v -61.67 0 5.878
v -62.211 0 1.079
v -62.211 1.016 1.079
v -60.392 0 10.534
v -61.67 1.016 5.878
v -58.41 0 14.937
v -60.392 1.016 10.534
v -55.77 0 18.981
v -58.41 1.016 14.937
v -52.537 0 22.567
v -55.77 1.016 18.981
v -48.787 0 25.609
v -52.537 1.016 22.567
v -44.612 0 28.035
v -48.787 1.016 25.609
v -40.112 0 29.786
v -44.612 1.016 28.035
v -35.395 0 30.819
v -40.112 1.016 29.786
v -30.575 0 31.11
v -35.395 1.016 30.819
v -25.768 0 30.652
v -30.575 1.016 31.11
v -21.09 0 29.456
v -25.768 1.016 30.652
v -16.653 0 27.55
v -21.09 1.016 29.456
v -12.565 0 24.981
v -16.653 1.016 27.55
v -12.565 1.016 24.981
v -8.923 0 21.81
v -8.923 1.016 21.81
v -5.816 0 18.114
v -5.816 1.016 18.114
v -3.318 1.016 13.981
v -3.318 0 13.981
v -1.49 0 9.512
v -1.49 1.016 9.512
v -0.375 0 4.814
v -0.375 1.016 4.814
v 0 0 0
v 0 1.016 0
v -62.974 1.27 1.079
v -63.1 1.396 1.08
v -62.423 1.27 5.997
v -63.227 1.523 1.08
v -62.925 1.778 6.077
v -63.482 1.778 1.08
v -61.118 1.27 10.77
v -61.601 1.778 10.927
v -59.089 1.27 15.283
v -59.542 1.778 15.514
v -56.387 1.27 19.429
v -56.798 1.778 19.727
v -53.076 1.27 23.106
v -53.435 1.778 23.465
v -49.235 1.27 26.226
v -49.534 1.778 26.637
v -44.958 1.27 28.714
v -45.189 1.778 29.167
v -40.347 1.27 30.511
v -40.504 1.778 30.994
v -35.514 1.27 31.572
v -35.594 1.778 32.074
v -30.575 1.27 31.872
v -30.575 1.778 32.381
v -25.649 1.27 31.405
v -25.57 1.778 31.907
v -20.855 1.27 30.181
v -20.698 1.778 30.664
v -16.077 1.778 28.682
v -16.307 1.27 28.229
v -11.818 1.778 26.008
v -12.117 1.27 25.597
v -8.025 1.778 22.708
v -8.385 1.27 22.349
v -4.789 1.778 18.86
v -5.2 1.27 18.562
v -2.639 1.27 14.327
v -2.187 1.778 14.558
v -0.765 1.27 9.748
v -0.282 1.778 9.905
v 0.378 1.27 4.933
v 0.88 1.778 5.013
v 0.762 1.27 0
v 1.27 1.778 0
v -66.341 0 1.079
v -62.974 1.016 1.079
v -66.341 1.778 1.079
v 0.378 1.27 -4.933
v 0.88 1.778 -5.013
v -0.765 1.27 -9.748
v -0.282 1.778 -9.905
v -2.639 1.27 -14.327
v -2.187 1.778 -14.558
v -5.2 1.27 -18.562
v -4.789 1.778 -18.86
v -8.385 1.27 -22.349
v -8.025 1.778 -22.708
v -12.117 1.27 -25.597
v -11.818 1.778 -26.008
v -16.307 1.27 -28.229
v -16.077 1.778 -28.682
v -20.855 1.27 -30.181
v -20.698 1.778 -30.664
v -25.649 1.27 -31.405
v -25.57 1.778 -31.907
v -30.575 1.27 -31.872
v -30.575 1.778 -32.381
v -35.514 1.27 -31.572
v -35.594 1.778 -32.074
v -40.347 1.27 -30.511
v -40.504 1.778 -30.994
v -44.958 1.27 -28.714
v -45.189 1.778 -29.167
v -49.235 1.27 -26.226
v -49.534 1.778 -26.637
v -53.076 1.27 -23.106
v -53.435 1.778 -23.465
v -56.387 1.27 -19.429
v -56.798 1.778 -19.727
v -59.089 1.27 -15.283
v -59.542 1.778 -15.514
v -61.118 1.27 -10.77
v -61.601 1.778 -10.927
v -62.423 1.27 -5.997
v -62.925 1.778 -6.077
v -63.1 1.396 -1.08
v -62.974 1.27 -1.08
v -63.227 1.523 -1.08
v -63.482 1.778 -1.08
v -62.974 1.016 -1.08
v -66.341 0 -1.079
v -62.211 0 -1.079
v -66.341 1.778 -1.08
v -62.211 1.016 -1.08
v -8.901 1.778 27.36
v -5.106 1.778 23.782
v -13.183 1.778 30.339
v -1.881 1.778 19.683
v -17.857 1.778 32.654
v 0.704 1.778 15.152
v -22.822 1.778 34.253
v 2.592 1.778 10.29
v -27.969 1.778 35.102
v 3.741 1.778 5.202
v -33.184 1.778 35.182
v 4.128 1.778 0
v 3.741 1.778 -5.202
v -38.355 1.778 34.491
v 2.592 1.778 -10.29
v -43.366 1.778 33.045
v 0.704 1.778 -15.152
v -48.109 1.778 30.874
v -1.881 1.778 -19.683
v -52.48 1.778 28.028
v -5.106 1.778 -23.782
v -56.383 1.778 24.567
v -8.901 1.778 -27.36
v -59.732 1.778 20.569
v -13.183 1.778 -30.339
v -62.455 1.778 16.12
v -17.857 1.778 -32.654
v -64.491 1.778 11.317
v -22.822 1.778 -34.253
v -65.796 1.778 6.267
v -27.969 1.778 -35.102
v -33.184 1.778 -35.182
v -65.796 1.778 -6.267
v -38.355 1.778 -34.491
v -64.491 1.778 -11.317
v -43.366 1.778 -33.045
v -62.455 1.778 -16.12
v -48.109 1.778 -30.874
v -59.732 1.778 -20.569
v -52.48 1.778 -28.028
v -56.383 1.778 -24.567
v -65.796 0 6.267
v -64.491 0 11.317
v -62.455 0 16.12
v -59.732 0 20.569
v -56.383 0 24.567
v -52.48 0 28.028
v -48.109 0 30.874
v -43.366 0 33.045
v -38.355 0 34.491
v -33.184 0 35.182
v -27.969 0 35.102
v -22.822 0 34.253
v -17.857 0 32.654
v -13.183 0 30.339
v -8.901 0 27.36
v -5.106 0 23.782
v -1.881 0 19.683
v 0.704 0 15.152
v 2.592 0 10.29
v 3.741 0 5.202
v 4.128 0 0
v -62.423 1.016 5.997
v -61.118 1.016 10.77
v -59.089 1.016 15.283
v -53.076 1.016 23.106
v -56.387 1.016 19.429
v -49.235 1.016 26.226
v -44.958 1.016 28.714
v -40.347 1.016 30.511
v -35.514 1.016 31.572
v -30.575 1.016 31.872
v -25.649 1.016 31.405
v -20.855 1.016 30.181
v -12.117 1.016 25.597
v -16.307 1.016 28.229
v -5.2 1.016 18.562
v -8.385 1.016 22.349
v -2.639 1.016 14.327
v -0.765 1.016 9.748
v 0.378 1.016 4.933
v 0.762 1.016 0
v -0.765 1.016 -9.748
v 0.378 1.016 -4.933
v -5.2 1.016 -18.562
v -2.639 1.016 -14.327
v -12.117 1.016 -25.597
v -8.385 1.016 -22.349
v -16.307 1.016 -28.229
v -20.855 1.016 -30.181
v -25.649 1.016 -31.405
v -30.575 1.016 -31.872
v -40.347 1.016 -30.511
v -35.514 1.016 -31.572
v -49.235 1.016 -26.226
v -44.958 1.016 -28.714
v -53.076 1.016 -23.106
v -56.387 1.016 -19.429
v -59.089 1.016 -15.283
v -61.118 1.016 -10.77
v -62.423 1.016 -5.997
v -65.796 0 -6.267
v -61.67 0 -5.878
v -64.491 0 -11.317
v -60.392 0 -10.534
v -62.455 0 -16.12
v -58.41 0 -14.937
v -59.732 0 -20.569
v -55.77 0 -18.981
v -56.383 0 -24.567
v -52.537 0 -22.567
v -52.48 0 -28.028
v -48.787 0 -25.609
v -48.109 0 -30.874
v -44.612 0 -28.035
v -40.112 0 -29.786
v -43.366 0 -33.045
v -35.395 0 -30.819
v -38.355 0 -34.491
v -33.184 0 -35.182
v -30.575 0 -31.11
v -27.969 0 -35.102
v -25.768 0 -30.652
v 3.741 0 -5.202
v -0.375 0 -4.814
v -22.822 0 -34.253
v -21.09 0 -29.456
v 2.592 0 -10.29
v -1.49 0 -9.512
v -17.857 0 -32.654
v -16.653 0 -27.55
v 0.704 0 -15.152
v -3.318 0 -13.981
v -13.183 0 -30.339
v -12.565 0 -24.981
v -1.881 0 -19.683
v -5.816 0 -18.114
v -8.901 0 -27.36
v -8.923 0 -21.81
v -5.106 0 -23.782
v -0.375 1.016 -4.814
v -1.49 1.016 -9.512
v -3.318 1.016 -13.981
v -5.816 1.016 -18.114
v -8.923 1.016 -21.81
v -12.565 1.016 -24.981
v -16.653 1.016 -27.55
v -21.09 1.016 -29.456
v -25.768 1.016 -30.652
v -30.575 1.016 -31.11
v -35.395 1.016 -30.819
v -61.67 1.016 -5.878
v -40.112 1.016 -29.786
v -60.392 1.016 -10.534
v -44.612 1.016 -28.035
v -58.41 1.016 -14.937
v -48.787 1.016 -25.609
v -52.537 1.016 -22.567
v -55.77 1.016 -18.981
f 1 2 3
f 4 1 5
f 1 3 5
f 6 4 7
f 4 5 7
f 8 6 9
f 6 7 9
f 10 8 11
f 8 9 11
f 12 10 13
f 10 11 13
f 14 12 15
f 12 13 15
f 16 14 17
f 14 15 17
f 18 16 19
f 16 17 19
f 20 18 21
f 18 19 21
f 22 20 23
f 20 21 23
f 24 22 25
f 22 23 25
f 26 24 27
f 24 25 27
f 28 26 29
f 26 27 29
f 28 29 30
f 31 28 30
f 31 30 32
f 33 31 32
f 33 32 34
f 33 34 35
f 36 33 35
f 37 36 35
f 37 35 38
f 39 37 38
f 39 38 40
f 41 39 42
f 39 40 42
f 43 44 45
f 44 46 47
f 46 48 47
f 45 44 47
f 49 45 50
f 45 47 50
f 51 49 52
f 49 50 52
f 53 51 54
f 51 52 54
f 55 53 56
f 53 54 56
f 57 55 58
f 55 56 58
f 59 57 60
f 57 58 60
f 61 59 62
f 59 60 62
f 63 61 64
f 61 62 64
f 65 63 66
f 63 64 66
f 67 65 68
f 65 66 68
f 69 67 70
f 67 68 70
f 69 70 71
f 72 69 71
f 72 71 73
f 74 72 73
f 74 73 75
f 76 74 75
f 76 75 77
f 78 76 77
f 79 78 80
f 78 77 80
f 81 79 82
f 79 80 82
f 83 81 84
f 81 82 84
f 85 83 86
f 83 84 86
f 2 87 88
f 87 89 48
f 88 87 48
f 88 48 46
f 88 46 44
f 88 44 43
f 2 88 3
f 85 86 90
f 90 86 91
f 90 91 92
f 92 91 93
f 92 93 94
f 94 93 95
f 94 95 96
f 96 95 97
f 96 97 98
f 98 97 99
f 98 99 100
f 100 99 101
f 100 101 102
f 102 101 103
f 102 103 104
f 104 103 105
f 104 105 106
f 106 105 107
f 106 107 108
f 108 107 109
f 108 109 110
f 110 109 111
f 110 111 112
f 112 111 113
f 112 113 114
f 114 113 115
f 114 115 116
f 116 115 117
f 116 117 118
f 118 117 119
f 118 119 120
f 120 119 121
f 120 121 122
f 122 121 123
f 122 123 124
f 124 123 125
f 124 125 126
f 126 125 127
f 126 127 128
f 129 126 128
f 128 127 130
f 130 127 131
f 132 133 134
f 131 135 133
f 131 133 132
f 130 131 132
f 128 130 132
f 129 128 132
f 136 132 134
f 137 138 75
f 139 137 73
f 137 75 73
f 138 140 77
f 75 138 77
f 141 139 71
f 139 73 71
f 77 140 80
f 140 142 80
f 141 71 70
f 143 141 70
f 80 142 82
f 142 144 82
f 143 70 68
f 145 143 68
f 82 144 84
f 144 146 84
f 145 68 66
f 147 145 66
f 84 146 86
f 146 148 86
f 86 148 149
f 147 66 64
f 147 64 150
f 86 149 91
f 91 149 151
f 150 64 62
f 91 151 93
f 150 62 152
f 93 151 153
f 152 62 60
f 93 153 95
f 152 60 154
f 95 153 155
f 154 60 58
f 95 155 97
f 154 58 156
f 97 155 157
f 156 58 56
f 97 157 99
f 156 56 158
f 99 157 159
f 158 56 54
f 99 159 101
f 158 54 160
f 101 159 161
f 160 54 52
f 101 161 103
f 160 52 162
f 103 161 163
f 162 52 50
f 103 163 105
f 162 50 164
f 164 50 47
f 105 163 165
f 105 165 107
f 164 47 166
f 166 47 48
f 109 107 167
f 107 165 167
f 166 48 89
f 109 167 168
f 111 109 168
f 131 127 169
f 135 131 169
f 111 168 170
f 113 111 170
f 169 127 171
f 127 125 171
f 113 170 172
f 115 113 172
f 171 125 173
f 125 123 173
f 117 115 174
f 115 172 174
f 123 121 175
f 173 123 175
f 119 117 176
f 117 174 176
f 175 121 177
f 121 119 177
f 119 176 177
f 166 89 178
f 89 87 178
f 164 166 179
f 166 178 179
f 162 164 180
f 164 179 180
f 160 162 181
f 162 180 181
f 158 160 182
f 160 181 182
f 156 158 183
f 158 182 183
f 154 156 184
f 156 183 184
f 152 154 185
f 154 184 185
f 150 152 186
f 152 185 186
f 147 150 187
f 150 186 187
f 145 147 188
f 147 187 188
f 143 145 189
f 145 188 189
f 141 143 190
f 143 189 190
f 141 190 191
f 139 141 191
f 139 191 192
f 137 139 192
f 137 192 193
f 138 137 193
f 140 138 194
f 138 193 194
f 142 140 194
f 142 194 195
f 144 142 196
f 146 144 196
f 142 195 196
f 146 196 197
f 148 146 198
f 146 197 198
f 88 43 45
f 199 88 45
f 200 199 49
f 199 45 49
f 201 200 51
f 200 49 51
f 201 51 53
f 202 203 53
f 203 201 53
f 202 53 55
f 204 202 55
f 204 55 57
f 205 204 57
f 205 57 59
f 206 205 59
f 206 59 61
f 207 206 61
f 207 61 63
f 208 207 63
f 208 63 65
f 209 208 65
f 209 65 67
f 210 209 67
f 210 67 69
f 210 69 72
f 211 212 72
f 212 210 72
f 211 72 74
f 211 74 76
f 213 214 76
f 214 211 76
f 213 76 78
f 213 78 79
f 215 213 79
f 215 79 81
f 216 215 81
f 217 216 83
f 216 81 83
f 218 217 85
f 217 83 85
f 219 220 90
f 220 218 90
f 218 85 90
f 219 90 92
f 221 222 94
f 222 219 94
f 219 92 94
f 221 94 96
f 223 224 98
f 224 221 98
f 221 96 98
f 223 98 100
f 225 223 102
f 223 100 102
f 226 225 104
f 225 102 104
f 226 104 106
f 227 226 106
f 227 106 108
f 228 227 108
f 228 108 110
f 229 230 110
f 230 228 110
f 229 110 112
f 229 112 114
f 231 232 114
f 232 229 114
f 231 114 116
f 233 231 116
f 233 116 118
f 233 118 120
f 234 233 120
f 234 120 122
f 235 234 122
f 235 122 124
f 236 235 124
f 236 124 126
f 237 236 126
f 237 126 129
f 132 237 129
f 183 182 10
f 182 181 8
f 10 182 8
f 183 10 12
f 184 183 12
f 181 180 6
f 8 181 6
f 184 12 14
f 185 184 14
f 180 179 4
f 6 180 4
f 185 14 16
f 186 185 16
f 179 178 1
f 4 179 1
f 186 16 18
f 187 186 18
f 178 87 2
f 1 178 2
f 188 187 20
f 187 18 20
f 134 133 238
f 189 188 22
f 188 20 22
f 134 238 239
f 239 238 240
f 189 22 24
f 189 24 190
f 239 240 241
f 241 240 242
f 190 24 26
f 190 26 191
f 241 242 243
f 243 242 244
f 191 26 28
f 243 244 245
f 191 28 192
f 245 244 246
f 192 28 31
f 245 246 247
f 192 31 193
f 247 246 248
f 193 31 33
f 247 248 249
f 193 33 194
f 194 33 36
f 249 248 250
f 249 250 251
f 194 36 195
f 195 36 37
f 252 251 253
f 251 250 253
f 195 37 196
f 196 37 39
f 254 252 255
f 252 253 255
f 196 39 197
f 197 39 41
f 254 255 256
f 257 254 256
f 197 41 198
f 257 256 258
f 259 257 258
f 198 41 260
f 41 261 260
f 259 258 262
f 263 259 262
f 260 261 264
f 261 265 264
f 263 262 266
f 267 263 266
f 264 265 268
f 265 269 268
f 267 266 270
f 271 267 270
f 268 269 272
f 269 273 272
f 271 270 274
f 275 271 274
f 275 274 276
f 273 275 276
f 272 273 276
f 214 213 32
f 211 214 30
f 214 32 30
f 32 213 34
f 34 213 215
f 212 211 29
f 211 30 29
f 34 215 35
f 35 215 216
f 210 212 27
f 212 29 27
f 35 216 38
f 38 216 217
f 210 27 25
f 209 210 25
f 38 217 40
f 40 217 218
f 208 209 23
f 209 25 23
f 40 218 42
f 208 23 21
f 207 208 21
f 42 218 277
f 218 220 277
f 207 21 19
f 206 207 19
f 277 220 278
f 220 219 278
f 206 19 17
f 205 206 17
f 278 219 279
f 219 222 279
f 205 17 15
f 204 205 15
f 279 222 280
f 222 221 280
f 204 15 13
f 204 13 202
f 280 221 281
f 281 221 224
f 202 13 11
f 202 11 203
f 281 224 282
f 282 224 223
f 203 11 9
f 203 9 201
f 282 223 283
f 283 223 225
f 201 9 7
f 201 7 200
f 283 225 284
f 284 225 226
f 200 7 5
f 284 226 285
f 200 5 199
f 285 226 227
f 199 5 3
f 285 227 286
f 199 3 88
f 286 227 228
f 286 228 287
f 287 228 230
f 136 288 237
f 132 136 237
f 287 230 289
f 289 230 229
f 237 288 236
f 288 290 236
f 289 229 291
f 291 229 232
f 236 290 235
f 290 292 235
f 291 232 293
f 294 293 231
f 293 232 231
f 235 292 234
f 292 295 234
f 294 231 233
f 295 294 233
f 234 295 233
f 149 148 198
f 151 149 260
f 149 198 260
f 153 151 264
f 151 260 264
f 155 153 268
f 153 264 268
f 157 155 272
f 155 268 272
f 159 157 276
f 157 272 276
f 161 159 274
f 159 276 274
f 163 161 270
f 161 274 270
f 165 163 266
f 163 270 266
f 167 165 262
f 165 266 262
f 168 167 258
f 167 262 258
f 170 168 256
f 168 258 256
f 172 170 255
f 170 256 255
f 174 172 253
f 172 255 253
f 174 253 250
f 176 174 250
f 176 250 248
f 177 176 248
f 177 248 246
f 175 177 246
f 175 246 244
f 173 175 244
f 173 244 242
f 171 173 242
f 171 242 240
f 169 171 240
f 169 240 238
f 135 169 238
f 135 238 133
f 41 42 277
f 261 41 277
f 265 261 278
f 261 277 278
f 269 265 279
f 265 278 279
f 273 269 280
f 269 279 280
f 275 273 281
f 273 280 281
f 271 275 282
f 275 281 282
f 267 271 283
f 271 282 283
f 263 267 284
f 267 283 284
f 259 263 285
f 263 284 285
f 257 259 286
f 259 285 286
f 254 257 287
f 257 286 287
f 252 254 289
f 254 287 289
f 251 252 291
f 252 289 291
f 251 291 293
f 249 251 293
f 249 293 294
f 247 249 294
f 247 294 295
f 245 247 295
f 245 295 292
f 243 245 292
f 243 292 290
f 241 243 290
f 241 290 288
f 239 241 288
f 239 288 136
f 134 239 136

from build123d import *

# Parameters (mm, degrees)
INNER_CHAMFER_SIZE  = 0.508
SLIT_CUT_DEPTH      = 1.0795
SLIT_CUT_DEPTH_BACK = 1.0795
SLIT_SKETCH_W       = 25.449079392
SLIT_SKETCH_H       = 3.3923794


with BuildPart() as part:
    # Primary Sketch → Primary Revolve (revolve)
    with BuildSketch(Plane.XY):
        Polygon((4.1275, 1.778), (4.1275, 0), (0, 0), (0, 1.016), (0.762, 1.016), (0.762, 1.778), align=None)
    revolve(axis=Axis((-31.115, 0, 0), (0, 1, 0)))

    # Inner Chamfer
    inner_chamfer_edges = [part.edges().sort_by_distance(p)[0] for p in [
        (-62.992, 1.778, 0),
    ]]
    chamfer(inner_chamfer_edges, length=INNER_CHAMFER_SIZE)

    # Slit Sketch → Slit Cut (cut, two sides: drawn at the far end of the back side and taken through both)
    with BuildSketch(Plane.XY.offset(-SLIT_CUT_DEPTH_BACK)):
        with Locations((-62.246580084, 1.6961897)):
            Rectangle(SLIT_SKETCH_W, SLIT_SKETCH_H)
    extrude(amount=SLIT_CUT_DEPTH + SLIT_CUT_DEPTH_BACK, mode=Mode.SUBTRACT)


solid = part.part
